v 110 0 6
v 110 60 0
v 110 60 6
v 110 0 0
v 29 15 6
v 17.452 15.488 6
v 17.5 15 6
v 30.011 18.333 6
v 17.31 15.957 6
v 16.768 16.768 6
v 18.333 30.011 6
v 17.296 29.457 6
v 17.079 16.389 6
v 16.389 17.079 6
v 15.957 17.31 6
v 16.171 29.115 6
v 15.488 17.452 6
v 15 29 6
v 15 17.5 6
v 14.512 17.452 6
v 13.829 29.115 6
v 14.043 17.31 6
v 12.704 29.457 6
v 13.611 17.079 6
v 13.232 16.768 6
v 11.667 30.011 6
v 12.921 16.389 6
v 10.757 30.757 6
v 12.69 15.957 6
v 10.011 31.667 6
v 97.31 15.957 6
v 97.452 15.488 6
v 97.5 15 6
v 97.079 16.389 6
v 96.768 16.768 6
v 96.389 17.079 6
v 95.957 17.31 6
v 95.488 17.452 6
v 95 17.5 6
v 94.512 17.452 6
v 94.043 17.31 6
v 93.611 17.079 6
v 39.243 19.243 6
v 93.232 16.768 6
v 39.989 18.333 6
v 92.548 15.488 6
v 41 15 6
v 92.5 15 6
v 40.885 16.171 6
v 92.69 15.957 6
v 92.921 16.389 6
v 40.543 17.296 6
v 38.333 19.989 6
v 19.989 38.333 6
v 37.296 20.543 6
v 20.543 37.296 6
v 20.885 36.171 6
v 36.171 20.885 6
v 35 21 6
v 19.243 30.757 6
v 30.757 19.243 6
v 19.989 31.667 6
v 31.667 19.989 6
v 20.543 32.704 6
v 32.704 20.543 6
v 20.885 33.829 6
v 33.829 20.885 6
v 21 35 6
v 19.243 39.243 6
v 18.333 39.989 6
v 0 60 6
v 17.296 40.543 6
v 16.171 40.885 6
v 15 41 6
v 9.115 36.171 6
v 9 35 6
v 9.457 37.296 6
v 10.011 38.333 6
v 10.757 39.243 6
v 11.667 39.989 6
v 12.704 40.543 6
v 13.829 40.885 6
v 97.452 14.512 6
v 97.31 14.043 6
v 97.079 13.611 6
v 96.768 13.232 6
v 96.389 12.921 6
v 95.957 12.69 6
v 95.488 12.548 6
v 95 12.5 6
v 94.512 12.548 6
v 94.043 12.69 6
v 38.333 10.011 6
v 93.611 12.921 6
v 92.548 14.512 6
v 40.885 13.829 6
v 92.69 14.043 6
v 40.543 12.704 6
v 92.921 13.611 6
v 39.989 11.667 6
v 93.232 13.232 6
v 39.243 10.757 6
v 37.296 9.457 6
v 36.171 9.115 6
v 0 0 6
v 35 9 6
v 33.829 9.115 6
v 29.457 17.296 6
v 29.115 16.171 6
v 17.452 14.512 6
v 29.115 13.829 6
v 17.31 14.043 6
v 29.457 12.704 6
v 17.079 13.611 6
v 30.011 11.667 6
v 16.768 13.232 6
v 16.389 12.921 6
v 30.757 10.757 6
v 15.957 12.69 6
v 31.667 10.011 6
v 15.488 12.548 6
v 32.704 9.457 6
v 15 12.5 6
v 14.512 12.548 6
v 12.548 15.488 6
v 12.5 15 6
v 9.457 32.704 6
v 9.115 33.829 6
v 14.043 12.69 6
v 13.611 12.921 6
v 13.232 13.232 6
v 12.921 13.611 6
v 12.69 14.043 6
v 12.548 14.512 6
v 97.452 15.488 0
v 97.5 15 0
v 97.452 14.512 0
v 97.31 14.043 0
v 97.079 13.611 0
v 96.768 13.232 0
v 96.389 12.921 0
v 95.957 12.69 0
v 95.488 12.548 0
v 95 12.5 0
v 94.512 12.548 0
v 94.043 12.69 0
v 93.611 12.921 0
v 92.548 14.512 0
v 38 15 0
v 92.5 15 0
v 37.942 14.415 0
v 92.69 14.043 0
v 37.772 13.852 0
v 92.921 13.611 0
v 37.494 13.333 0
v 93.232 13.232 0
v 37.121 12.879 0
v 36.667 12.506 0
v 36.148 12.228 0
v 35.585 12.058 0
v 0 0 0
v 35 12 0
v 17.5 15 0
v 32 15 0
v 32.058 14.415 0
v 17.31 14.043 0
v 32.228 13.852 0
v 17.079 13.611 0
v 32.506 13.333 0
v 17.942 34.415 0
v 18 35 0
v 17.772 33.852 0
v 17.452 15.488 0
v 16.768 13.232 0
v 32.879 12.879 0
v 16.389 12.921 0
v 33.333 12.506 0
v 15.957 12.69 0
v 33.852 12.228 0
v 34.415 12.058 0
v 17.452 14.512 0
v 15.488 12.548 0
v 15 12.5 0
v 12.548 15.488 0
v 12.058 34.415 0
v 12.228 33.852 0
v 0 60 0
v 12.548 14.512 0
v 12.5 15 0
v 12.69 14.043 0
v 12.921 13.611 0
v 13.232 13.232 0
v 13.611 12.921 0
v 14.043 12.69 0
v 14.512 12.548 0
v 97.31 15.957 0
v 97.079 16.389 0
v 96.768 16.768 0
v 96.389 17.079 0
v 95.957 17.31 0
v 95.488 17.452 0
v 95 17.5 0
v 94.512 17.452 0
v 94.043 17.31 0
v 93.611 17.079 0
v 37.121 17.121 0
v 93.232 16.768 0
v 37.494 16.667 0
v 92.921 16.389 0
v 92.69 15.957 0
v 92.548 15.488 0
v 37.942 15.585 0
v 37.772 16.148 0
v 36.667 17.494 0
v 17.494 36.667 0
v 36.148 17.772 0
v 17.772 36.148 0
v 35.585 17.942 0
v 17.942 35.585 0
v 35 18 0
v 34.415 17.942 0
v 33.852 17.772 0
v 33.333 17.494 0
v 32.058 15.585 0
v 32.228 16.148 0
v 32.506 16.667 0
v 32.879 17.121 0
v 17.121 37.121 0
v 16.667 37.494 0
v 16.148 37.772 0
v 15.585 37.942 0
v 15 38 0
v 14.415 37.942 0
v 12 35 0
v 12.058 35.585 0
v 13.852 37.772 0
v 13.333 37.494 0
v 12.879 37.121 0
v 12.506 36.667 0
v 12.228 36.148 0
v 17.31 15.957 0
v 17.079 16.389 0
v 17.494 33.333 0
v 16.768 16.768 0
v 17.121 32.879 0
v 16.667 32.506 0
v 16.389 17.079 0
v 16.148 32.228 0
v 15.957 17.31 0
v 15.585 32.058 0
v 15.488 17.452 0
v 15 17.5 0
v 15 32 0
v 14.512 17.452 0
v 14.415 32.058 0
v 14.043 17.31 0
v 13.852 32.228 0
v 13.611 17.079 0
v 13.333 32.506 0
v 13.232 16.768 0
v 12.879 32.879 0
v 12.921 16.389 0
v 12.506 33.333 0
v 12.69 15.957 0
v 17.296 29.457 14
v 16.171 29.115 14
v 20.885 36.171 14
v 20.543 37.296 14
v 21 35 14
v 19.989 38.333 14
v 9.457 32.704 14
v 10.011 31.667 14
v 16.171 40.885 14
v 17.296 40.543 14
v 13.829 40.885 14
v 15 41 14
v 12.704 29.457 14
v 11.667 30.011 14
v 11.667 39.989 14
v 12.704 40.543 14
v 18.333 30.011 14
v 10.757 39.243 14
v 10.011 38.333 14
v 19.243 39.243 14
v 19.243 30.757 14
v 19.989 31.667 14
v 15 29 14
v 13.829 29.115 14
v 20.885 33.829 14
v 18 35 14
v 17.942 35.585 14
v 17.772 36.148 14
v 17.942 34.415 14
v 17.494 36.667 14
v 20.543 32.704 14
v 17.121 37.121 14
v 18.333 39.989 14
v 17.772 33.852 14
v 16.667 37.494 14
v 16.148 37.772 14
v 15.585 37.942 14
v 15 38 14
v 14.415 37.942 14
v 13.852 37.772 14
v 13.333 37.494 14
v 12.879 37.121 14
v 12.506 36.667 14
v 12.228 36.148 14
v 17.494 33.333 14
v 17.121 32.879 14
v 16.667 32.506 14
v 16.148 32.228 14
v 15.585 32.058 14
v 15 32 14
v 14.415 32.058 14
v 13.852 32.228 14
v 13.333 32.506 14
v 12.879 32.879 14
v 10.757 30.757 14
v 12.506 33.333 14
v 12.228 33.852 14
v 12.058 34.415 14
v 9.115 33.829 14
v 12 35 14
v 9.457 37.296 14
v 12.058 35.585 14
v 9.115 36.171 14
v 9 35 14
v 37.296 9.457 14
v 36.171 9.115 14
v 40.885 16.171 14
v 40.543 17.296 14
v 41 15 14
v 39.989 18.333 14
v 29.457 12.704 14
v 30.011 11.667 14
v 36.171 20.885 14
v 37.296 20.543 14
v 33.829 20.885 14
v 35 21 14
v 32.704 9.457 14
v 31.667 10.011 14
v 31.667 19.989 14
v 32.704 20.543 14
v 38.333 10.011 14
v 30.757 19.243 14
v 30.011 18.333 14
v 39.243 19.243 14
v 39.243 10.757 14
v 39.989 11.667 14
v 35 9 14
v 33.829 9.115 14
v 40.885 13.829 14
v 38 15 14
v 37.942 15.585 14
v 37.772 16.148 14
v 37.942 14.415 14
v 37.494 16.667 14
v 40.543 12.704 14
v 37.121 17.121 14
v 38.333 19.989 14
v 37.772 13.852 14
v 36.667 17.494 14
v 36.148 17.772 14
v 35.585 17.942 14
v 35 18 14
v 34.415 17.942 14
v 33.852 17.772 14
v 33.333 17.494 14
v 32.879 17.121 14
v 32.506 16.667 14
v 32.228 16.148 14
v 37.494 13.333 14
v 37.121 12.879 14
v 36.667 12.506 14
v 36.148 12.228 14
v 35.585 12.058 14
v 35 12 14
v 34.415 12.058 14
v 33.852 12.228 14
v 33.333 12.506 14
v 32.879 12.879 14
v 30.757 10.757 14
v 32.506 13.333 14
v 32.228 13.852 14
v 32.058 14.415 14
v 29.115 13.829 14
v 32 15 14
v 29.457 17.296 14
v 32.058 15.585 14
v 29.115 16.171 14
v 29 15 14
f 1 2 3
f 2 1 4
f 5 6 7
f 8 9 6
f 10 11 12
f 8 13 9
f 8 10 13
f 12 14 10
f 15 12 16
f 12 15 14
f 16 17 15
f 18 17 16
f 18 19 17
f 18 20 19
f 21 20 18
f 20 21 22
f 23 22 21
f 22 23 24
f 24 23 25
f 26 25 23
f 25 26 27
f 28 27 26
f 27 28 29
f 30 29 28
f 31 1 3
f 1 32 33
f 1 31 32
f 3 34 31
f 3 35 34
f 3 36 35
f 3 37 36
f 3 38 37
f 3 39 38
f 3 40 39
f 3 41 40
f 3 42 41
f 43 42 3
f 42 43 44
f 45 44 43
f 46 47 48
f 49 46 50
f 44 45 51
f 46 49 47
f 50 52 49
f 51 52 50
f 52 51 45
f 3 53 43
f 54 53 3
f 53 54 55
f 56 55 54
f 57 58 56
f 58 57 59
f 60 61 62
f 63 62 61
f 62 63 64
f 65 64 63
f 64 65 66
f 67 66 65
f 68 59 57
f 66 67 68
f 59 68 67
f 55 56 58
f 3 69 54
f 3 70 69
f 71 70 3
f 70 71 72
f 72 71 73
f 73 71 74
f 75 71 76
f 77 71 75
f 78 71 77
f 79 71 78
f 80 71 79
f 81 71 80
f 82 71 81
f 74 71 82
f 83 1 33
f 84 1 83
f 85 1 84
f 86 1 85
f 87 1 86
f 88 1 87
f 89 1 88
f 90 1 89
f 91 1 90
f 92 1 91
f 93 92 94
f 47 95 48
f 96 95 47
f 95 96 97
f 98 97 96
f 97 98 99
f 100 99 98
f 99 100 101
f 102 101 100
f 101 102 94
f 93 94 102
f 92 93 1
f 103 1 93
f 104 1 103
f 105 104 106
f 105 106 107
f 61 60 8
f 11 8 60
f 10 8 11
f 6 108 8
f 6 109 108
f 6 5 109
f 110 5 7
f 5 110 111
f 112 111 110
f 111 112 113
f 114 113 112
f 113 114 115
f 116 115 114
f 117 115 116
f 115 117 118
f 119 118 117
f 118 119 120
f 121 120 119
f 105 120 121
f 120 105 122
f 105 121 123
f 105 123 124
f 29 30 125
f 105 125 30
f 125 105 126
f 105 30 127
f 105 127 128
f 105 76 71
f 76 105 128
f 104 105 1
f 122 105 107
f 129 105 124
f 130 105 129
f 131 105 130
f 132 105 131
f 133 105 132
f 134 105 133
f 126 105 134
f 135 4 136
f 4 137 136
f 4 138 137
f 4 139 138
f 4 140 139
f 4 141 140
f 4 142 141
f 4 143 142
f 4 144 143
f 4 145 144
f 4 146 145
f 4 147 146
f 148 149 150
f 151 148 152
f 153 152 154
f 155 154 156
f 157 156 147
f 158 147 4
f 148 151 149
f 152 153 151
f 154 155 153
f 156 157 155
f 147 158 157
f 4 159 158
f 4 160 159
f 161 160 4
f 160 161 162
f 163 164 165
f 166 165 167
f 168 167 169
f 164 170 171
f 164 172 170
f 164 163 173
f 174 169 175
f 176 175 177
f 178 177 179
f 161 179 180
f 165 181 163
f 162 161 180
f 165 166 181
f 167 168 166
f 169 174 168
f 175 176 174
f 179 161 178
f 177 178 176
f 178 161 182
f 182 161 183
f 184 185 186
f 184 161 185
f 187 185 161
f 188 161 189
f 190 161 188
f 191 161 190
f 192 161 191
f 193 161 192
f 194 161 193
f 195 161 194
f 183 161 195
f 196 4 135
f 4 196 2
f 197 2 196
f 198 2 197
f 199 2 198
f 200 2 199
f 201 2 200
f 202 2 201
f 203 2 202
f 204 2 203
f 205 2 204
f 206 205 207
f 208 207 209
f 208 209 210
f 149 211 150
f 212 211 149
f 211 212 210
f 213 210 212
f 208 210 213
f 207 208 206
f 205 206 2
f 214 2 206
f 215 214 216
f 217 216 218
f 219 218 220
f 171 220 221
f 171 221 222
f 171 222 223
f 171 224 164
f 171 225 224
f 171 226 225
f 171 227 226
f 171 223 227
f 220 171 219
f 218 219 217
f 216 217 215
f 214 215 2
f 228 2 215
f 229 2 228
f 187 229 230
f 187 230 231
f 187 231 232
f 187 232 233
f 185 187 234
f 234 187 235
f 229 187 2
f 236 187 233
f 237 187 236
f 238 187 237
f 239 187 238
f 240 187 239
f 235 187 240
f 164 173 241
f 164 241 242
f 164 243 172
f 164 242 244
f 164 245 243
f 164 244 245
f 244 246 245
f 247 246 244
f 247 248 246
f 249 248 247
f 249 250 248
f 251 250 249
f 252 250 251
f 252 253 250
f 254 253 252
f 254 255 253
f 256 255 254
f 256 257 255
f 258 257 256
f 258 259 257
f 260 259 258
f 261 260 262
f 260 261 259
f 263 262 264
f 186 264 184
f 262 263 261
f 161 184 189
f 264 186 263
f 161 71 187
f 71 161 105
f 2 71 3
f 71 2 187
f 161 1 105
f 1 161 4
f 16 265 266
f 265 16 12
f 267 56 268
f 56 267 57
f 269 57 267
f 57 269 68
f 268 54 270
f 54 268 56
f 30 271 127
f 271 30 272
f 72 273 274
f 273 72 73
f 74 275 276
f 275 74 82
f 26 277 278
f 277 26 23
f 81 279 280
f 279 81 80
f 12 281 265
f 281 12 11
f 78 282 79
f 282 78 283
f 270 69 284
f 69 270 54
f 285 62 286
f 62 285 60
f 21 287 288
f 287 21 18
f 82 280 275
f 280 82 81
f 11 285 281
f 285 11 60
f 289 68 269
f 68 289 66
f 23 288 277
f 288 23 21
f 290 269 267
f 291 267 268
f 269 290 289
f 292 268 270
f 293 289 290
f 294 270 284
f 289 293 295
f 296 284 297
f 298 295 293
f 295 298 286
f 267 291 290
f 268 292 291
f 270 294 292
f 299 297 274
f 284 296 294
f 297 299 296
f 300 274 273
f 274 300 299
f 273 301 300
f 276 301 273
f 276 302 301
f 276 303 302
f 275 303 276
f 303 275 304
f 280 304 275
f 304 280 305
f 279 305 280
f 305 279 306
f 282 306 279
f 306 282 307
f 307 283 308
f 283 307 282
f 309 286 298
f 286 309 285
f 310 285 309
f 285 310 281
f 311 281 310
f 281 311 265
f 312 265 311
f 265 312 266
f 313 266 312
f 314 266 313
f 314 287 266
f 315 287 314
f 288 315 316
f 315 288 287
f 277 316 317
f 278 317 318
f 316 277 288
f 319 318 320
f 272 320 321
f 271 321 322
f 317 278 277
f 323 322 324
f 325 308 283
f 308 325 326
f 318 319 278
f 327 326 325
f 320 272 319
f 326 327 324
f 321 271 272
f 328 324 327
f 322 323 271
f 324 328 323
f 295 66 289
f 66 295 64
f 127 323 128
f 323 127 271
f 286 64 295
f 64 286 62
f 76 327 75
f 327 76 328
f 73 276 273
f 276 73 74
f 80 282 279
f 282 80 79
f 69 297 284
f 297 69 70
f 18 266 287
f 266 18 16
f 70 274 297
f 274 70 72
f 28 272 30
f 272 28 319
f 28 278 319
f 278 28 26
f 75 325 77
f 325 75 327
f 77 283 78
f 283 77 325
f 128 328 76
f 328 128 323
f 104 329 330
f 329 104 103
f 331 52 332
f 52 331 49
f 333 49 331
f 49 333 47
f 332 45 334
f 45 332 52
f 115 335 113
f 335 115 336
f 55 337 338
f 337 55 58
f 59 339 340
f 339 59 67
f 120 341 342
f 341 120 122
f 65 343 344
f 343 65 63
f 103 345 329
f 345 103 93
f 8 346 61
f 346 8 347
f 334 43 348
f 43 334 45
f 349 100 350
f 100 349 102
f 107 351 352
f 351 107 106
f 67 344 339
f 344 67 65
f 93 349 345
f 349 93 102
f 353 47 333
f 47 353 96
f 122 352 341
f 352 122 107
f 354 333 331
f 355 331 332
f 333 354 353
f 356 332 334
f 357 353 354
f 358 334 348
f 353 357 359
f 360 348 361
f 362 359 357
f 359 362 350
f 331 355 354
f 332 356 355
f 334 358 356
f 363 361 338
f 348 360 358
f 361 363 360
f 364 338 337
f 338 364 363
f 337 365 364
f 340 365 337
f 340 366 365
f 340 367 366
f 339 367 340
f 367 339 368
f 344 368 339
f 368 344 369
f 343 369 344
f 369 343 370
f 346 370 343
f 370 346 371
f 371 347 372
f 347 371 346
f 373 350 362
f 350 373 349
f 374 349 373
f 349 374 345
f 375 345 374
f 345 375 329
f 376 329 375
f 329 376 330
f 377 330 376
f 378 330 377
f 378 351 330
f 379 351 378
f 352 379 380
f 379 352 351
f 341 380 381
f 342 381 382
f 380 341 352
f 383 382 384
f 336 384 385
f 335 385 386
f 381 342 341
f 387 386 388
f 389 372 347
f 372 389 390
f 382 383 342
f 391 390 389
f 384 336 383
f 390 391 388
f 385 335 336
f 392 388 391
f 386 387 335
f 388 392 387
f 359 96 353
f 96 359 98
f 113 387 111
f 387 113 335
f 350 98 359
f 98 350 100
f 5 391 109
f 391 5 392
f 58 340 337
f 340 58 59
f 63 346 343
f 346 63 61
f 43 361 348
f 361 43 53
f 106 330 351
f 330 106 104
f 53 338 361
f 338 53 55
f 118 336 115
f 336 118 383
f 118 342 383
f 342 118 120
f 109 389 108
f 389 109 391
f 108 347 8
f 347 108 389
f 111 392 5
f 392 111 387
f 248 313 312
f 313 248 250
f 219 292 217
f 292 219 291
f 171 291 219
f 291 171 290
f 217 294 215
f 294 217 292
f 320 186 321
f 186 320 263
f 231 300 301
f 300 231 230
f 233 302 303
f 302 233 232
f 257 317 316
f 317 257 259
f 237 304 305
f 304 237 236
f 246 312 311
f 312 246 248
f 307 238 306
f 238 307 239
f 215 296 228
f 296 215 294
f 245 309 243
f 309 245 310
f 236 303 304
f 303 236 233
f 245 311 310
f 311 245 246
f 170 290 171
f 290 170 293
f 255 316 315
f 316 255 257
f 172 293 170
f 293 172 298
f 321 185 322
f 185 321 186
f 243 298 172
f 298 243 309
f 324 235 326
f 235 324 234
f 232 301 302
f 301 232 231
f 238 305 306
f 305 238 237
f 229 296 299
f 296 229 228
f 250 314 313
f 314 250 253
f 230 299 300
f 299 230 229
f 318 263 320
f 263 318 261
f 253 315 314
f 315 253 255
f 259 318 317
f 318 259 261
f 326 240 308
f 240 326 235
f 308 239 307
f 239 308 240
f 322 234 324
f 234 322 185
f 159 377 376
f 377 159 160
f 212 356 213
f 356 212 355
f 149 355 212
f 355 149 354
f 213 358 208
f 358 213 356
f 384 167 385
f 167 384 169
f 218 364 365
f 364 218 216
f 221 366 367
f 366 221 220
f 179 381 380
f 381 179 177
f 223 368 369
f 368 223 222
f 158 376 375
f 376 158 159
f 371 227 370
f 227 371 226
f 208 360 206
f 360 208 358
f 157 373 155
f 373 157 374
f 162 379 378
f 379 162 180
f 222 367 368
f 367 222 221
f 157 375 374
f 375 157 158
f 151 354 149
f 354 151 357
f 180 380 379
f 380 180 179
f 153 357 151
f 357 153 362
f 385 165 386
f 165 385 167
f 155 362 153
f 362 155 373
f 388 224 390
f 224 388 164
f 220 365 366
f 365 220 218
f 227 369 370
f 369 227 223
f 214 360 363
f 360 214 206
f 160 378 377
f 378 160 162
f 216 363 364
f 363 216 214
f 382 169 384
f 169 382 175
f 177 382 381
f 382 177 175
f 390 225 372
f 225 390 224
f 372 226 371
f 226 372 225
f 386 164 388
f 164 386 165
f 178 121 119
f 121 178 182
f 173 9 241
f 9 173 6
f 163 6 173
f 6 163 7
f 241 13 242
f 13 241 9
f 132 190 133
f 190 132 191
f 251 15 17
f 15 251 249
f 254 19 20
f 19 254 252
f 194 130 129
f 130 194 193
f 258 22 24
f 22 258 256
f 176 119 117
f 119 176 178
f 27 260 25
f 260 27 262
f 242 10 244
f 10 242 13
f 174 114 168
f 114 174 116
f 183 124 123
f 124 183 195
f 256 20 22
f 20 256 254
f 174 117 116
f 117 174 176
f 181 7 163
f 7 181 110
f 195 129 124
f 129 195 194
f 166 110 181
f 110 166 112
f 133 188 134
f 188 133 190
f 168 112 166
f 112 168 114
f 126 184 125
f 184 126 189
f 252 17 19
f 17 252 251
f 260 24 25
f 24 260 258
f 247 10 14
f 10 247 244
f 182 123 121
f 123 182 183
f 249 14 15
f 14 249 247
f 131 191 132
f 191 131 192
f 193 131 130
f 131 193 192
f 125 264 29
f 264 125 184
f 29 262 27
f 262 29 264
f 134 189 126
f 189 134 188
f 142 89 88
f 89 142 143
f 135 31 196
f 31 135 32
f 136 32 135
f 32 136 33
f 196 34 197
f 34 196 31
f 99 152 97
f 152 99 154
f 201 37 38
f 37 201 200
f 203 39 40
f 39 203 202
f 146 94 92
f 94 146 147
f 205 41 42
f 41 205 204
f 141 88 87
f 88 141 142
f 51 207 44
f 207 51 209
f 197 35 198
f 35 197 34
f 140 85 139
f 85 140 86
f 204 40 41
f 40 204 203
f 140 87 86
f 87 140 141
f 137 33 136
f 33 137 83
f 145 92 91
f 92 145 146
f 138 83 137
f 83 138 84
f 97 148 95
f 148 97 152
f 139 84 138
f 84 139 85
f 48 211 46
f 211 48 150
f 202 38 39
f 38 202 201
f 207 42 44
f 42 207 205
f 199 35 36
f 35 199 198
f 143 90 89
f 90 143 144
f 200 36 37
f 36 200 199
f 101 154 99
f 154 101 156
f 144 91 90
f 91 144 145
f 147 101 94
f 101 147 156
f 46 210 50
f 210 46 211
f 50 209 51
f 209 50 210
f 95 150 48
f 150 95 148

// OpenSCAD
$fn = 32;

// ----------------------------------------------------------------------
// Mixed field: bosses and holes at given coordinates
// ----------------------------------------------------------------------

// --- parameters (mm) ---
plate_l = 110;            // plate length, X
plate_w = 60;             // plate width, Y
plate_t = 6;              // plate thickness, Z
boss_d = 12;              // boss diameter
boss_h = 8;               // boss height above the plate
hole_d = 5;               // through hole diameter

total_h = plate_t + boss_h;  // overall height

difference() {
  union() {
    cube([plate_l, plate_w, plate_t]);
    translate([15, 35, plate_t]) cylinder(h = boss_h, d = boss_d);
    translate([35, 15, plate_t]) cylinder(h = boss_h, d = boss_d);
  }
  translate([15, 35, -1]) cylinder(h = total_h + 2, d = boss_d / 2);
  translate([35, 15, -1]) cylinder(h = total_h + 2, d = boss_d / 2);
  translate([15, 15, -1]) cylinder(h = plate_t + 2, d = hole_d);
  translate([95, 15, -1]) cylinder(h = plate_t + 2, d = hole_d);
}
